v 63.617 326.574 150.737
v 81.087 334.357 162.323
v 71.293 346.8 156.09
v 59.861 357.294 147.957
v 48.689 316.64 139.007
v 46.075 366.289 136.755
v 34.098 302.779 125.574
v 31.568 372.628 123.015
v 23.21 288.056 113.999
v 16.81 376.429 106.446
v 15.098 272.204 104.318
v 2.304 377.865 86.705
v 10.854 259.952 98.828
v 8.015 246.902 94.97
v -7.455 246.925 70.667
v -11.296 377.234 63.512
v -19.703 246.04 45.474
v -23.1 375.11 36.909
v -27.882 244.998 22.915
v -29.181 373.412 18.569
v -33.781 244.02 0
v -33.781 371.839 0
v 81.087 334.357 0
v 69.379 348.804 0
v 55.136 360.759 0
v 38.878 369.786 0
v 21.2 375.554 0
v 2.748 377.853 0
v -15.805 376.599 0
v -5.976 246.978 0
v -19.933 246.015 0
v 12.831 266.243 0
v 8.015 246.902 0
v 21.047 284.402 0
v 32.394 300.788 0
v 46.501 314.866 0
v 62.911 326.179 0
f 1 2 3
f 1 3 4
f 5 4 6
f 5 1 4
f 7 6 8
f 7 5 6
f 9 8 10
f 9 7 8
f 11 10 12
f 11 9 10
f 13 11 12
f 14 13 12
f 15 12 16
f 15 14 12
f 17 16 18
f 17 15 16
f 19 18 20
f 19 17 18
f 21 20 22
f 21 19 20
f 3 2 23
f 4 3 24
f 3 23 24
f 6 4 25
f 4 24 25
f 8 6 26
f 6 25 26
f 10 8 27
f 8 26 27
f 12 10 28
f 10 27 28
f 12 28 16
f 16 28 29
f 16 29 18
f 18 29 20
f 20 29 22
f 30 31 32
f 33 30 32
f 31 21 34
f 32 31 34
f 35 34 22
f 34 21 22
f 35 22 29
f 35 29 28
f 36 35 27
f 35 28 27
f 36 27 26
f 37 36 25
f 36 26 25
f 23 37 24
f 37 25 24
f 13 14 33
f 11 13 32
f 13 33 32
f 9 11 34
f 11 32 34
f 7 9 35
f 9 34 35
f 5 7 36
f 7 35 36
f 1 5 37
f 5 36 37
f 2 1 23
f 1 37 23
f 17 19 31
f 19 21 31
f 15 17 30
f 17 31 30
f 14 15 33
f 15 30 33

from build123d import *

# Parameters (mm, degrees)
F1_DEPTH = 168.3612558991
F2_R     = 248.5661214156
F3_DEPTH = 465.3762876987


with BuildPart() as f1:
    # F0 (on Top) → F1 (new body)
    with BuildSketch(Plane.XY):
        with BuildLine():
            ThreePointArc((8.0145221095, 246.9024653068), (32.3936051962, 300.7875887608), (81.0866635692, 334.3574009155))
            ThreePointArc((81.0866635692, 334.3574009155), (-53.0382414334, 362.1621199722), (-82.0123294419, 228.2849569913))
            ThreePointArc((-82.0123294419, 228.2849569913), (-38.1519563911, 243.1694146609), (8.0145221095, 246.9024653068))
        make_face()
    extrude(amount=F1_DEPTH)


with BuildPart() as f3:
    # F2 (on Front) → F3 (new body)
    with BuildSketch(Plane.XZ):
        with Locations((209.6148729324, -50.4343286157)):
            Circle(F2_R)
    extrude(amount=-F3_DEPTH)


with BuildPart() as f1_1:
    add(f1.part)

    # F4: intersect F3
    add(f3.part, mode=Mode.INTERSECT)


solid = f1_1.part
